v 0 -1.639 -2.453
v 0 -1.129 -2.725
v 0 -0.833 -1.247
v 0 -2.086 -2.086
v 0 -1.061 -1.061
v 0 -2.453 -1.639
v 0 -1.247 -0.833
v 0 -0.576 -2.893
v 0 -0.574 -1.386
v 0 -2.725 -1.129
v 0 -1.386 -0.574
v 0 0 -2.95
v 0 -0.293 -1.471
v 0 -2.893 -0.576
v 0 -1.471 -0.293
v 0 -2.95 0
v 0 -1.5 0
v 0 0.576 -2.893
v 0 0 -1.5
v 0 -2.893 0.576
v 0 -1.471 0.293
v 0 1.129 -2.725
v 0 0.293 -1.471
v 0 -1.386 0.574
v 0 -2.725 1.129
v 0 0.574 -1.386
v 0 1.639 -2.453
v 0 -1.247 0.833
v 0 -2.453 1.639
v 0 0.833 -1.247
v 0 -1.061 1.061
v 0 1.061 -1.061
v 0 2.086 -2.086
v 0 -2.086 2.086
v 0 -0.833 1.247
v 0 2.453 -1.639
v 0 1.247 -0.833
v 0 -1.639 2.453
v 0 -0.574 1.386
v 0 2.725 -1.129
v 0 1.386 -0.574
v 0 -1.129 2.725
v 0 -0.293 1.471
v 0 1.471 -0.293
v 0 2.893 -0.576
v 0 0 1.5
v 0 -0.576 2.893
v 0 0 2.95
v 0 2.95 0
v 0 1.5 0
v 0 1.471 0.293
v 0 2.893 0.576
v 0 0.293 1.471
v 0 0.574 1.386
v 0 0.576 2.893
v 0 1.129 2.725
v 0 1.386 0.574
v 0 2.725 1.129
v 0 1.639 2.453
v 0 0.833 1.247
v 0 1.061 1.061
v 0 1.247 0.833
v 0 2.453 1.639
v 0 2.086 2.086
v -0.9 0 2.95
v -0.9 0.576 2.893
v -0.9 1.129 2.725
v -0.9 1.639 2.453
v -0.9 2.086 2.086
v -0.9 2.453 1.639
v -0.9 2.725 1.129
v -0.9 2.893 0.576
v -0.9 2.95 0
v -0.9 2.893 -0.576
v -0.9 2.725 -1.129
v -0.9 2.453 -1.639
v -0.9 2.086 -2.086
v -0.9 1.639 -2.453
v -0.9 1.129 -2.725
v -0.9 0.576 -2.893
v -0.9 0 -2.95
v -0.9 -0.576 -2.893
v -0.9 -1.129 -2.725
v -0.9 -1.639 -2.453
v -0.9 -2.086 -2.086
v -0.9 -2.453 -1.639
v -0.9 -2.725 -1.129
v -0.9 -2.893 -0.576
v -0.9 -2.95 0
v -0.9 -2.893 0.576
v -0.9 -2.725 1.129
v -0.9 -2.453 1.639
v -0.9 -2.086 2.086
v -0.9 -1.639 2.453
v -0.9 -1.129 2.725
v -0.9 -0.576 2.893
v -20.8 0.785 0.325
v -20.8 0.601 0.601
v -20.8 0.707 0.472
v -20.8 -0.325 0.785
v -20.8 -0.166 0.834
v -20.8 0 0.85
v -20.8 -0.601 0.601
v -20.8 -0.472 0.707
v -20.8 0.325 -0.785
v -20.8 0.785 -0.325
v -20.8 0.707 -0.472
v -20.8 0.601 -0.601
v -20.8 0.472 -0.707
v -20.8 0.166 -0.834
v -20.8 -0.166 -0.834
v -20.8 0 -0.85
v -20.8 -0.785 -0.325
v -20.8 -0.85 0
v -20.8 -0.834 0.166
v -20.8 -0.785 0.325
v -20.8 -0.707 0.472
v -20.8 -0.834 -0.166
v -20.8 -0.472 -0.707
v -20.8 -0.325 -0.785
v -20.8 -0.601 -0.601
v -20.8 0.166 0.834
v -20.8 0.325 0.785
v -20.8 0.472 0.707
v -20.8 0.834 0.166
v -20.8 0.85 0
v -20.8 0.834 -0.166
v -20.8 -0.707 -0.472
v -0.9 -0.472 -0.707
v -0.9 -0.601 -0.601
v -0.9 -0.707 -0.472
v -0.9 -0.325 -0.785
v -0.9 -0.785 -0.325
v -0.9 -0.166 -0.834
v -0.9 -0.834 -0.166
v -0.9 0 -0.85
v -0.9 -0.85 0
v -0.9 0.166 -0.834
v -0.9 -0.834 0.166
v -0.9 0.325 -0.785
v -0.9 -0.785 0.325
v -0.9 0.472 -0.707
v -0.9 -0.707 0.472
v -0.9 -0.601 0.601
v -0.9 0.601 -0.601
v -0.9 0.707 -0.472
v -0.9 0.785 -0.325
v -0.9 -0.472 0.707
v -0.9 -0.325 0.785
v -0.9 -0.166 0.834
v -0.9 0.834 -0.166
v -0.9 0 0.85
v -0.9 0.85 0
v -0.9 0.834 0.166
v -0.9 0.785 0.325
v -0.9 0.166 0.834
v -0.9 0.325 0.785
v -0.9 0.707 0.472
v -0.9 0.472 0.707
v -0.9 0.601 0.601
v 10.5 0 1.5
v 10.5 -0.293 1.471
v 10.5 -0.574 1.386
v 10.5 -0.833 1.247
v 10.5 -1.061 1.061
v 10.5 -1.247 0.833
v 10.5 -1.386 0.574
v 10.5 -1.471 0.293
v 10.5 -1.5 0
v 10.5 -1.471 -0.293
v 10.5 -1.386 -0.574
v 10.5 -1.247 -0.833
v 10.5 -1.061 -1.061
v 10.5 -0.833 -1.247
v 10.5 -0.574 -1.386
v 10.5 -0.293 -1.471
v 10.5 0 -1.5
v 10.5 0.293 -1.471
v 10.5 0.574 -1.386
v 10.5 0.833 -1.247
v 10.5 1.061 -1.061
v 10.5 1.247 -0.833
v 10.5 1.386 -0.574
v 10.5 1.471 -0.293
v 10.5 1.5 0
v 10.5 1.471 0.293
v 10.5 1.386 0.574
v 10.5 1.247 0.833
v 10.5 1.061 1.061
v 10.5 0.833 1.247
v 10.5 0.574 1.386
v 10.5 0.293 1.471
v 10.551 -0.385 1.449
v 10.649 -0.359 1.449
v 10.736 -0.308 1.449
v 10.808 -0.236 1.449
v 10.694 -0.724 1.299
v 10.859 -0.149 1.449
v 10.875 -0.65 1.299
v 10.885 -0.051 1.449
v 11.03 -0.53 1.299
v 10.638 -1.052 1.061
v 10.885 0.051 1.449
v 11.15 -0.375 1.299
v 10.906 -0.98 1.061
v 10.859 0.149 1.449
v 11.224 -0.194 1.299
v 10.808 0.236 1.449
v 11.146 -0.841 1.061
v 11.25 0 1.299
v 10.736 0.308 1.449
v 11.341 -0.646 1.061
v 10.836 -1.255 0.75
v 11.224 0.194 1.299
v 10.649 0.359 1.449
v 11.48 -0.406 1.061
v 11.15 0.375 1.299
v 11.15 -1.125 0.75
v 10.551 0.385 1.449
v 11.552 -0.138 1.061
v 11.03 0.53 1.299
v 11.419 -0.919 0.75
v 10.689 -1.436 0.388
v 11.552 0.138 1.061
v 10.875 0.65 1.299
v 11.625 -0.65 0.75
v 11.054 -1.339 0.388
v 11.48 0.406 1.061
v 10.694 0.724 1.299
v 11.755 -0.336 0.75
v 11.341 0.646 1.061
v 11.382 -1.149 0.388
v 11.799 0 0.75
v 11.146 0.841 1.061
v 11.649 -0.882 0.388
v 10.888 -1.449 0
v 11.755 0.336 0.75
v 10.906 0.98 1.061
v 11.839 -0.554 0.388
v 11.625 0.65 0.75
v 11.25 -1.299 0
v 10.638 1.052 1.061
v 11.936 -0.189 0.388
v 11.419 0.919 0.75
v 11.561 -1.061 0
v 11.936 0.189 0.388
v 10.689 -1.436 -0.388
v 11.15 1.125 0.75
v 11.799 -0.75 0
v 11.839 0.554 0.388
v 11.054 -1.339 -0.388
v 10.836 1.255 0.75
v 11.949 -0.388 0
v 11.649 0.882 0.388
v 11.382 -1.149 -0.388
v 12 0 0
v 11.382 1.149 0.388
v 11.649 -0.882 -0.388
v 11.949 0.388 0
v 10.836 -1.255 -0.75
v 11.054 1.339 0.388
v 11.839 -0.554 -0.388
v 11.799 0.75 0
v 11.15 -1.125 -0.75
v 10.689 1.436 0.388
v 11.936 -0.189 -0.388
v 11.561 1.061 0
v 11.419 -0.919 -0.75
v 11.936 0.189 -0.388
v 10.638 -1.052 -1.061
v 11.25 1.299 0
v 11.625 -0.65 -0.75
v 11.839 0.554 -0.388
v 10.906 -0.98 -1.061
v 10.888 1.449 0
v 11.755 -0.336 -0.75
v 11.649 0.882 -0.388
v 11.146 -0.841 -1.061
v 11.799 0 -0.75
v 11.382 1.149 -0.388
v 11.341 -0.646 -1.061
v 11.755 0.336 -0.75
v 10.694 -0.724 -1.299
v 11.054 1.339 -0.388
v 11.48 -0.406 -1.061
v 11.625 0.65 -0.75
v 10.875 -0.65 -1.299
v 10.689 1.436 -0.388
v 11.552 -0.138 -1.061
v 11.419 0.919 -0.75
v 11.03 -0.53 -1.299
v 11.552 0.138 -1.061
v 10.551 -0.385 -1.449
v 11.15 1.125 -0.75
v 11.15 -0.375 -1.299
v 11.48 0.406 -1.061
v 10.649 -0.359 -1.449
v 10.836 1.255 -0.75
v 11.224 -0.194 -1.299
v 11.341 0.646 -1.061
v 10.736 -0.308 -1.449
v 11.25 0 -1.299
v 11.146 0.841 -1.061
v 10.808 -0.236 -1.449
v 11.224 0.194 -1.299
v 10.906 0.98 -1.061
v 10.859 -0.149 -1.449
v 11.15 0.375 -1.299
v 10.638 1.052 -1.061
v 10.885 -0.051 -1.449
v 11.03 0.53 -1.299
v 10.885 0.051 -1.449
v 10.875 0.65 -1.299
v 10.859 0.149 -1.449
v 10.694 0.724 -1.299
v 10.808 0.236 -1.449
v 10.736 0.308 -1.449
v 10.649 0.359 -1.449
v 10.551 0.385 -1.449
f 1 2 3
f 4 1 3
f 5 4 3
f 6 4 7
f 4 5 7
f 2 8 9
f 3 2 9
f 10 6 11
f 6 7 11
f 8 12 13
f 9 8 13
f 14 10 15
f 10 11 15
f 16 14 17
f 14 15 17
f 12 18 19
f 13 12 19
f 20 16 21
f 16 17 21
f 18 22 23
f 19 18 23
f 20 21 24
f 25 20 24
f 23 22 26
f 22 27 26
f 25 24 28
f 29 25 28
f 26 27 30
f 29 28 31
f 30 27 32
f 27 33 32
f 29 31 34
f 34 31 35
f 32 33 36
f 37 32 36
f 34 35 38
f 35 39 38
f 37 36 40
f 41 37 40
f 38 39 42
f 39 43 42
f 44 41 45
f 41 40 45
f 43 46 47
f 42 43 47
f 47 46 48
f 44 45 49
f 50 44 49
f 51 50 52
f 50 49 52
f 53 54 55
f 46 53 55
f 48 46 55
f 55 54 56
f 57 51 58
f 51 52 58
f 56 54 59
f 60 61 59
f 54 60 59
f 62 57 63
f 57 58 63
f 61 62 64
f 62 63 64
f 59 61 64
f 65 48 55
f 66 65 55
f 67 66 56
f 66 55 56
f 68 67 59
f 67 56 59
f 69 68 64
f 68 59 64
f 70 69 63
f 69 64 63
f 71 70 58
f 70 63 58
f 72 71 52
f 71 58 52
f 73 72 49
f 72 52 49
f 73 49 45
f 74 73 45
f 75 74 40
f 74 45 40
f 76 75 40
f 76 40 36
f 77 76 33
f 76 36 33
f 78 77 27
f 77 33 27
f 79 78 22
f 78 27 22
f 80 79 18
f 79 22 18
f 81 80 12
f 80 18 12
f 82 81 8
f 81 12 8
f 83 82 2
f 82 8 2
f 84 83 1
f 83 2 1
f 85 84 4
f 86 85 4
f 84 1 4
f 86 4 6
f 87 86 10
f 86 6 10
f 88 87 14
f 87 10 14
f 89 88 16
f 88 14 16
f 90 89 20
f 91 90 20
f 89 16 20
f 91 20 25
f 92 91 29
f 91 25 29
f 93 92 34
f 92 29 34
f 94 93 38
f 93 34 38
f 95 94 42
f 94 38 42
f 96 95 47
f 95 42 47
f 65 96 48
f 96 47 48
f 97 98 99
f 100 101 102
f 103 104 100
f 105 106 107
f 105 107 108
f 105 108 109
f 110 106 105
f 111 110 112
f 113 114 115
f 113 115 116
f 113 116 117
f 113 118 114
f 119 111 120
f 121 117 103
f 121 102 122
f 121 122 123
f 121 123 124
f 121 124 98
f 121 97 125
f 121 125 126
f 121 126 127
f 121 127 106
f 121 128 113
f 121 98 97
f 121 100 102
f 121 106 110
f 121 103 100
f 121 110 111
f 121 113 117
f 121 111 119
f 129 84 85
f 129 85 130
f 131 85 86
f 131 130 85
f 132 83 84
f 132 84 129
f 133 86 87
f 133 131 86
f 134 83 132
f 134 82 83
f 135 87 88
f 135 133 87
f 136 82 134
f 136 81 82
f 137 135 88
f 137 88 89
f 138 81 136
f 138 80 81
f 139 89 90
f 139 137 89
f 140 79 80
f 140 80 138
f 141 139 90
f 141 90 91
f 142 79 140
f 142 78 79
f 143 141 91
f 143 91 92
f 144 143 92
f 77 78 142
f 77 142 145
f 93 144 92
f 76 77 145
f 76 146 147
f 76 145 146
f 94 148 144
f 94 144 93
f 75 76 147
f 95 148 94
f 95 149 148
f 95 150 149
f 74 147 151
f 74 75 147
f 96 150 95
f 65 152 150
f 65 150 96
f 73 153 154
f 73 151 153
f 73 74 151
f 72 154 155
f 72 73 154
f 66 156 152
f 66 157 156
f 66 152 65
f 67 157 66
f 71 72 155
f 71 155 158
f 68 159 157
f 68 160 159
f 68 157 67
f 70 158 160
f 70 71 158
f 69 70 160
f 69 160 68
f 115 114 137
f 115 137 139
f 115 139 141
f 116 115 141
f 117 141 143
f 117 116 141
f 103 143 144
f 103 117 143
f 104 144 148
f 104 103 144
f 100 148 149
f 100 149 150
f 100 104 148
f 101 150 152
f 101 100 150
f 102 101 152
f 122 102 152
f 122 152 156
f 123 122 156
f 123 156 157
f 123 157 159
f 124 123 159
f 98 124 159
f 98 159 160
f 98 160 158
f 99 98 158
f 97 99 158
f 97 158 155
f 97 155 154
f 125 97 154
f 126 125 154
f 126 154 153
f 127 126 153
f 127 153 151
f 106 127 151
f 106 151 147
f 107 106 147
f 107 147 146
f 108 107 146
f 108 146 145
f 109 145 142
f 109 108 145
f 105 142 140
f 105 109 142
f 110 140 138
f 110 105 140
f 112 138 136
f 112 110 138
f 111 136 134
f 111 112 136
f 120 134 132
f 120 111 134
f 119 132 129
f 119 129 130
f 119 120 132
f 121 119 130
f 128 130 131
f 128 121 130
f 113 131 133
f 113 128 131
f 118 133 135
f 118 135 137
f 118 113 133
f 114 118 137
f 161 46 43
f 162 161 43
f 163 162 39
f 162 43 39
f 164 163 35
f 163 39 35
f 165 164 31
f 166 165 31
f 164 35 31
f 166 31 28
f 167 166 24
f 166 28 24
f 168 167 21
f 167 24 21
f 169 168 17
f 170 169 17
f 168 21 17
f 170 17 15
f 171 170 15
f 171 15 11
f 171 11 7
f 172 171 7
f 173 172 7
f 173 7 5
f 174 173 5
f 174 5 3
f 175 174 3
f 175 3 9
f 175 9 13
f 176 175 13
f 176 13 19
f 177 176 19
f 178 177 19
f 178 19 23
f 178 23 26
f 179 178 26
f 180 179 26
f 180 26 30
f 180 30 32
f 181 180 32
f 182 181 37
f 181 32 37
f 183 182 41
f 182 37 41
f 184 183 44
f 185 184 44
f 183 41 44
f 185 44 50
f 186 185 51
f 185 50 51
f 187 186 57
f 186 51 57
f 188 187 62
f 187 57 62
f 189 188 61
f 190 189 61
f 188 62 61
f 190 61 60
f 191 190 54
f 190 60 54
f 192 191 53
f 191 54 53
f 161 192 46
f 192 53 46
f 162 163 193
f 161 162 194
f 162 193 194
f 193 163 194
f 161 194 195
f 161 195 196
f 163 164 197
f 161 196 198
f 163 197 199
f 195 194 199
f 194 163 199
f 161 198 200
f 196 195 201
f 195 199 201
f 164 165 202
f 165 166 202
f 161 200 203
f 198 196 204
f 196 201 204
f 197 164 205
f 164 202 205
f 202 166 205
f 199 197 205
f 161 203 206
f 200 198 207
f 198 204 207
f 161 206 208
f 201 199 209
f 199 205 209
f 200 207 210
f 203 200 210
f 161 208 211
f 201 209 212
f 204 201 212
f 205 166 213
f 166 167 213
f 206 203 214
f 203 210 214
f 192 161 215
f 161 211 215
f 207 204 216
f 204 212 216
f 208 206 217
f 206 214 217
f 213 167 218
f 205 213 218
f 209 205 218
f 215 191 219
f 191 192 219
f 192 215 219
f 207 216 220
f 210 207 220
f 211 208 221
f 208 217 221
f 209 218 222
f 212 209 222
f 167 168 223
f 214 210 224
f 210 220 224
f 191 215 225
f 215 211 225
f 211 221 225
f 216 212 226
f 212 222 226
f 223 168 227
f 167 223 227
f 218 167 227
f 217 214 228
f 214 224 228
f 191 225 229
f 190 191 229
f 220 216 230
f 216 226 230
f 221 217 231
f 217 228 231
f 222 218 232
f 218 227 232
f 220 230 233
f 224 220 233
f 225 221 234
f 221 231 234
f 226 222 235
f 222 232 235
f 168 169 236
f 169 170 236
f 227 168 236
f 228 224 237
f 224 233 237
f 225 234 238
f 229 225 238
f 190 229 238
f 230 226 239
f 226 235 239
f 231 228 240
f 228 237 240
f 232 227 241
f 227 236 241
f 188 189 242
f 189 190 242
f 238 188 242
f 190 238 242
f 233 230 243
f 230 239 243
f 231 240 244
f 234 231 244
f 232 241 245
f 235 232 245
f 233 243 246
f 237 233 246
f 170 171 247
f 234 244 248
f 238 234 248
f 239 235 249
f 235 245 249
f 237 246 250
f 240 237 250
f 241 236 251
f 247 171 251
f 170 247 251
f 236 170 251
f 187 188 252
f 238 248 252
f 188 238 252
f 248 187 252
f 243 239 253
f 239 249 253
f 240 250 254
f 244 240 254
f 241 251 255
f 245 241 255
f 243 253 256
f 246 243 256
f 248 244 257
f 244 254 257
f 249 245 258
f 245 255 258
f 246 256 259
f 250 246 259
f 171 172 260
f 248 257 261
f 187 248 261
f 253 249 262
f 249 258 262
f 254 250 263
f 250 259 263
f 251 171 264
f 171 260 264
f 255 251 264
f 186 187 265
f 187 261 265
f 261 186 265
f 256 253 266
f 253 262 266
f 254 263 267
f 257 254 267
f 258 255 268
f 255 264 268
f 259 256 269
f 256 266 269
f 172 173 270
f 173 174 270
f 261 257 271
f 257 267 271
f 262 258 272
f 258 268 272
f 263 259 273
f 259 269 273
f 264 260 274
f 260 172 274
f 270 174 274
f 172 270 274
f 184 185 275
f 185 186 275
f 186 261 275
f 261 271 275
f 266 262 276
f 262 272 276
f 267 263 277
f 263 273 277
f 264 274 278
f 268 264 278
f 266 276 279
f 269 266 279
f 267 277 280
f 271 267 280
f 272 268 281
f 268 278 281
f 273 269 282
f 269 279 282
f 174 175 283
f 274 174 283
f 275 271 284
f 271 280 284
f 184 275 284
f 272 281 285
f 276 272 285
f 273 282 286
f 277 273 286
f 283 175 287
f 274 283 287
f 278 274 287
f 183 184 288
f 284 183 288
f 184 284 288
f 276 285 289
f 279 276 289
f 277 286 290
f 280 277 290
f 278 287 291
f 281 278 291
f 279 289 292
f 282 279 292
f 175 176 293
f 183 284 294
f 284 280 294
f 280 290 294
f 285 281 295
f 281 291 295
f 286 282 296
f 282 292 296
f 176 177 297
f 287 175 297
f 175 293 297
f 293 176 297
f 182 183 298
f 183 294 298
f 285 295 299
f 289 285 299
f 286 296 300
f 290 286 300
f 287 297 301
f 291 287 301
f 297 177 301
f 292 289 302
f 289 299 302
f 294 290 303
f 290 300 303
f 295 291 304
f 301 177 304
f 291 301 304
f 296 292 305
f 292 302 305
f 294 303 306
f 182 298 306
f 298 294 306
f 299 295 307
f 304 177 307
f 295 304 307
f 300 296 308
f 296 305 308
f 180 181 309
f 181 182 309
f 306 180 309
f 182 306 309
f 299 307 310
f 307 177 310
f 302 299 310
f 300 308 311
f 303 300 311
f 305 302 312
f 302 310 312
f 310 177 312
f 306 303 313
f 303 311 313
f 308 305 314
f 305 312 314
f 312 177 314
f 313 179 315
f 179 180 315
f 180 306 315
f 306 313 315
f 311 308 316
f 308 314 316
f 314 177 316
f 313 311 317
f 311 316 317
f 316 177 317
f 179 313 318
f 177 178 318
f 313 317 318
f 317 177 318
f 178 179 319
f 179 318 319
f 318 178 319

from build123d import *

# Parameters (mm, degrees)
SKETCH1_R           = 1.5
BOSS_EXTRUDE1_DEPTH = 10.5
SKETCH2_R           = 2.95
BOSS_EXTRUDE2_DEPTH = 0.9
SWEEP1_PROFILE_R    = 0.85


with BuildPart() as part:
    # Sketch1 → Boss-Extrude1 (new body)
    with BuildSketch(Plane(origin=(0, 0, 0), x_dir=(0, 0, -1), z_dir=(1, 0, 0))):
        with Locations(Location((0, 0, 0), (0, 0, 180))):
            Circle(SKETCH1_R)
    extrude(amount=BOSS_EXTRUDE1_DEPTH)

    # Sketch8 → Revolve1 (revolve)
    with BuildSketch(Plane(origin=(10.5, 0, 0), x_dir=(0, 0, -1), z_dir=(1, 0, 0))):
        with BuildLine():
            Line((1.5, 0), (-1.5, 0))
            ThreePointArc((-1.5, 0), (0, 1.5), (1.5, 0))
        make_face()
    revolve(axis=Axis((10.5, 0, -1.5), (0, 0, 1)))

    # Sketch2 → Boss-Extrude2 (add)
    with BuildSketch(Plane.ZY):
        Circle(SKETCH2_R)
    extrude(amount=BOSS_EXTRUDE2_DEPTH)

    # Sweep1: sweep along a path in Sketch3
    with BuildLine(Plane.XY) as sweep1_path:
        Line((-0.9, 0), (-20.8, 0))
    # Sweep1 profile (on start of the path) → Sweep1 (sweep)
    with BuildSketch(Plane(origin=(-0.9, 0, 0), x_dir=(0, -1, 0), z_dir=(-1, 0, 0))):
        Circle(SWEEP1_PROFILE_R)
    sweep(path=sweep1_path.line)


solid = part.part
